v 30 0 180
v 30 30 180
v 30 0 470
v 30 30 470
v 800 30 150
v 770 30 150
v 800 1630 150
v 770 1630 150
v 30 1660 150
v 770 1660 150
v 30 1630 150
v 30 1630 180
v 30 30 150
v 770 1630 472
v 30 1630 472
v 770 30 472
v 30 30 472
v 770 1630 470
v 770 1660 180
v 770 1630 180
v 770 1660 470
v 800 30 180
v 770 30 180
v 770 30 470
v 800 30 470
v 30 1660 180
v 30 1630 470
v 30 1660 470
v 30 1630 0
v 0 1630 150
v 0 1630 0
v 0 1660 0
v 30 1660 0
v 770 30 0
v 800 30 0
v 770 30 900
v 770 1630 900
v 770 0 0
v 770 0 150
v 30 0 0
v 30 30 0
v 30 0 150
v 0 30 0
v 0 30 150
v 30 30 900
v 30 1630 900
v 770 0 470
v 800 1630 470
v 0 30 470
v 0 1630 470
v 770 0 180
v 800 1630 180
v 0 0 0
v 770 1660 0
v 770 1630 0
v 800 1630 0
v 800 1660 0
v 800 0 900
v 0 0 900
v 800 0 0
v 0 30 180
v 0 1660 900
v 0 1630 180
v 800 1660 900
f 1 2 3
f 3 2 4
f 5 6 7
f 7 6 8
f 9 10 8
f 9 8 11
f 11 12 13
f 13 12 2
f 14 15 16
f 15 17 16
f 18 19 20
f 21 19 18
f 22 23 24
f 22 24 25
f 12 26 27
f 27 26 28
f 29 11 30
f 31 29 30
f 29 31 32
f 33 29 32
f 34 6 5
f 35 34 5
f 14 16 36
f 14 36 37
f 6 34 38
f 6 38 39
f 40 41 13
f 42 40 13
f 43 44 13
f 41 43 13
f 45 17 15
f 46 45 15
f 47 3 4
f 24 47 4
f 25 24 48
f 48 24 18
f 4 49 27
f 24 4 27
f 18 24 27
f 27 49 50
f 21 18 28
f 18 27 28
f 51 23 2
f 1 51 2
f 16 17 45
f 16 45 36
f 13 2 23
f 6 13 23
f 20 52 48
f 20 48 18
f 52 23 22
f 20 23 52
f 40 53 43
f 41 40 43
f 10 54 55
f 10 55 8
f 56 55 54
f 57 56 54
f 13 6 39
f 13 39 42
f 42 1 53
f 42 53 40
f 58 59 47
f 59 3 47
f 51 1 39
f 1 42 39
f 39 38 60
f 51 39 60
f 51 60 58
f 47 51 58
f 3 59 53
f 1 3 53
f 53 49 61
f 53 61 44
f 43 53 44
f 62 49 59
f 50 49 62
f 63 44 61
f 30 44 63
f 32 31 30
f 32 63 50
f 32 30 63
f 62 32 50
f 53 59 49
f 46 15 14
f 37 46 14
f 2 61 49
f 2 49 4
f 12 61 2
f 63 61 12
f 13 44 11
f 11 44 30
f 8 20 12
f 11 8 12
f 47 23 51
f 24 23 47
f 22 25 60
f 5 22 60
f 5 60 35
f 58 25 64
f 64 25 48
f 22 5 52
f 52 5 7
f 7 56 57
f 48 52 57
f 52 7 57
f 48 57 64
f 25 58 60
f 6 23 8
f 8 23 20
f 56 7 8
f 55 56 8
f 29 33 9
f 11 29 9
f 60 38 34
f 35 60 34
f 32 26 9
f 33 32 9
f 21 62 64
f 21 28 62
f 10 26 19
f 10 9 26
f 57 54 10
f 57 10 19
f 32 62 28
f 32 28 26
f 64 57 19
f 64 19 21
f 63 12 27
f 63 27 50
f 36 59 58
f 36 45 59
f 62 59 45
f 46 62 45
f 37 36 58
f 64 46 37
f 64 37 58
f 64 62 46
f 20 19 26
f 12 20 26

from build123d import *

# Parameters (mm, degrees)
F0_W     = 1600
F0_H     = 290
F1_DEPTH = 800
F3_DEPTH = 500.001
F4_W     = 740
F4_H     = 150
F4_H_2   = 290
F5_DEPTH = 1660.001
F6_W     = 800
F6_H     = 1660
F6_W_2   = 740
F6_H_2   = 1600
F7_DEPTH = 400
F8_W     = 770
F8_H     = 1660
F9_DEPTH = 2


with BuildPart() as f1:
    # F0 (on Right) → F1 (new body)
    with BuildSketch(Plane.YZ):
        Polygon((0, 500), (0, 0), (30, 0), (30, 150), (1630, 150), (1630, 0), (1660, 0), (1660, 500), align=None)
        with Locations((830, 325)):
            Rectangle(F0_W, F0_H, mode=Mode.SUBTRACT)
    extrude(amount=F1_DEPTH)

    # F2 (on face) → F3 (cut, through all)
    with BuildSketch(Plane.XY.offset(500)):
        Polygon((30, 30), (770, 30), (770, 1630), (385, 1630), (30, 1630), align=None)
    extrude(amount=-F3_DEPTH, mode=Mode.SUBTRACT)

    # F4 (on face) → F5 (cut, through all)
    with BuildSketch(Plane(origin=(0, 1660, 0), x_dir=(-1, 0, 0), z_dir=(0, 1, 0))):
        with Locations((-400, 75)):
            Rectangle(F4_W, F4_H)
        with Locations((-400, 325)):
            Rectangle(F4_W, F4_H_2)
    extrude(amount=-F5_DEPTH, mode=Mode.SUBTRACT)

    # F6 (on face) → F7 (join)
    with BuildSketch(Plane.XY.offset(500)):
        with Locations((400, 830)):
            Rectangle(F6_W, F6_H)
        with Locations((400, 830)):
            Rectangle(F6_W_2, F6_H_2, mode=Mode.SUBTRACT)
    extrude(amount=F7_DEPTH)

    # F8 (on face) → F9 (join)
    with BuildSketch(Plane(origin=(0, 0, 470), x_dir=(1, 0, 0), z_dir=(0, 0, -1))):
        with Locations((385, -830)):
            Rectangle(F8_W, F8_H)
    extrude(amount=-F9_DEPTH)


solid = f1.part
